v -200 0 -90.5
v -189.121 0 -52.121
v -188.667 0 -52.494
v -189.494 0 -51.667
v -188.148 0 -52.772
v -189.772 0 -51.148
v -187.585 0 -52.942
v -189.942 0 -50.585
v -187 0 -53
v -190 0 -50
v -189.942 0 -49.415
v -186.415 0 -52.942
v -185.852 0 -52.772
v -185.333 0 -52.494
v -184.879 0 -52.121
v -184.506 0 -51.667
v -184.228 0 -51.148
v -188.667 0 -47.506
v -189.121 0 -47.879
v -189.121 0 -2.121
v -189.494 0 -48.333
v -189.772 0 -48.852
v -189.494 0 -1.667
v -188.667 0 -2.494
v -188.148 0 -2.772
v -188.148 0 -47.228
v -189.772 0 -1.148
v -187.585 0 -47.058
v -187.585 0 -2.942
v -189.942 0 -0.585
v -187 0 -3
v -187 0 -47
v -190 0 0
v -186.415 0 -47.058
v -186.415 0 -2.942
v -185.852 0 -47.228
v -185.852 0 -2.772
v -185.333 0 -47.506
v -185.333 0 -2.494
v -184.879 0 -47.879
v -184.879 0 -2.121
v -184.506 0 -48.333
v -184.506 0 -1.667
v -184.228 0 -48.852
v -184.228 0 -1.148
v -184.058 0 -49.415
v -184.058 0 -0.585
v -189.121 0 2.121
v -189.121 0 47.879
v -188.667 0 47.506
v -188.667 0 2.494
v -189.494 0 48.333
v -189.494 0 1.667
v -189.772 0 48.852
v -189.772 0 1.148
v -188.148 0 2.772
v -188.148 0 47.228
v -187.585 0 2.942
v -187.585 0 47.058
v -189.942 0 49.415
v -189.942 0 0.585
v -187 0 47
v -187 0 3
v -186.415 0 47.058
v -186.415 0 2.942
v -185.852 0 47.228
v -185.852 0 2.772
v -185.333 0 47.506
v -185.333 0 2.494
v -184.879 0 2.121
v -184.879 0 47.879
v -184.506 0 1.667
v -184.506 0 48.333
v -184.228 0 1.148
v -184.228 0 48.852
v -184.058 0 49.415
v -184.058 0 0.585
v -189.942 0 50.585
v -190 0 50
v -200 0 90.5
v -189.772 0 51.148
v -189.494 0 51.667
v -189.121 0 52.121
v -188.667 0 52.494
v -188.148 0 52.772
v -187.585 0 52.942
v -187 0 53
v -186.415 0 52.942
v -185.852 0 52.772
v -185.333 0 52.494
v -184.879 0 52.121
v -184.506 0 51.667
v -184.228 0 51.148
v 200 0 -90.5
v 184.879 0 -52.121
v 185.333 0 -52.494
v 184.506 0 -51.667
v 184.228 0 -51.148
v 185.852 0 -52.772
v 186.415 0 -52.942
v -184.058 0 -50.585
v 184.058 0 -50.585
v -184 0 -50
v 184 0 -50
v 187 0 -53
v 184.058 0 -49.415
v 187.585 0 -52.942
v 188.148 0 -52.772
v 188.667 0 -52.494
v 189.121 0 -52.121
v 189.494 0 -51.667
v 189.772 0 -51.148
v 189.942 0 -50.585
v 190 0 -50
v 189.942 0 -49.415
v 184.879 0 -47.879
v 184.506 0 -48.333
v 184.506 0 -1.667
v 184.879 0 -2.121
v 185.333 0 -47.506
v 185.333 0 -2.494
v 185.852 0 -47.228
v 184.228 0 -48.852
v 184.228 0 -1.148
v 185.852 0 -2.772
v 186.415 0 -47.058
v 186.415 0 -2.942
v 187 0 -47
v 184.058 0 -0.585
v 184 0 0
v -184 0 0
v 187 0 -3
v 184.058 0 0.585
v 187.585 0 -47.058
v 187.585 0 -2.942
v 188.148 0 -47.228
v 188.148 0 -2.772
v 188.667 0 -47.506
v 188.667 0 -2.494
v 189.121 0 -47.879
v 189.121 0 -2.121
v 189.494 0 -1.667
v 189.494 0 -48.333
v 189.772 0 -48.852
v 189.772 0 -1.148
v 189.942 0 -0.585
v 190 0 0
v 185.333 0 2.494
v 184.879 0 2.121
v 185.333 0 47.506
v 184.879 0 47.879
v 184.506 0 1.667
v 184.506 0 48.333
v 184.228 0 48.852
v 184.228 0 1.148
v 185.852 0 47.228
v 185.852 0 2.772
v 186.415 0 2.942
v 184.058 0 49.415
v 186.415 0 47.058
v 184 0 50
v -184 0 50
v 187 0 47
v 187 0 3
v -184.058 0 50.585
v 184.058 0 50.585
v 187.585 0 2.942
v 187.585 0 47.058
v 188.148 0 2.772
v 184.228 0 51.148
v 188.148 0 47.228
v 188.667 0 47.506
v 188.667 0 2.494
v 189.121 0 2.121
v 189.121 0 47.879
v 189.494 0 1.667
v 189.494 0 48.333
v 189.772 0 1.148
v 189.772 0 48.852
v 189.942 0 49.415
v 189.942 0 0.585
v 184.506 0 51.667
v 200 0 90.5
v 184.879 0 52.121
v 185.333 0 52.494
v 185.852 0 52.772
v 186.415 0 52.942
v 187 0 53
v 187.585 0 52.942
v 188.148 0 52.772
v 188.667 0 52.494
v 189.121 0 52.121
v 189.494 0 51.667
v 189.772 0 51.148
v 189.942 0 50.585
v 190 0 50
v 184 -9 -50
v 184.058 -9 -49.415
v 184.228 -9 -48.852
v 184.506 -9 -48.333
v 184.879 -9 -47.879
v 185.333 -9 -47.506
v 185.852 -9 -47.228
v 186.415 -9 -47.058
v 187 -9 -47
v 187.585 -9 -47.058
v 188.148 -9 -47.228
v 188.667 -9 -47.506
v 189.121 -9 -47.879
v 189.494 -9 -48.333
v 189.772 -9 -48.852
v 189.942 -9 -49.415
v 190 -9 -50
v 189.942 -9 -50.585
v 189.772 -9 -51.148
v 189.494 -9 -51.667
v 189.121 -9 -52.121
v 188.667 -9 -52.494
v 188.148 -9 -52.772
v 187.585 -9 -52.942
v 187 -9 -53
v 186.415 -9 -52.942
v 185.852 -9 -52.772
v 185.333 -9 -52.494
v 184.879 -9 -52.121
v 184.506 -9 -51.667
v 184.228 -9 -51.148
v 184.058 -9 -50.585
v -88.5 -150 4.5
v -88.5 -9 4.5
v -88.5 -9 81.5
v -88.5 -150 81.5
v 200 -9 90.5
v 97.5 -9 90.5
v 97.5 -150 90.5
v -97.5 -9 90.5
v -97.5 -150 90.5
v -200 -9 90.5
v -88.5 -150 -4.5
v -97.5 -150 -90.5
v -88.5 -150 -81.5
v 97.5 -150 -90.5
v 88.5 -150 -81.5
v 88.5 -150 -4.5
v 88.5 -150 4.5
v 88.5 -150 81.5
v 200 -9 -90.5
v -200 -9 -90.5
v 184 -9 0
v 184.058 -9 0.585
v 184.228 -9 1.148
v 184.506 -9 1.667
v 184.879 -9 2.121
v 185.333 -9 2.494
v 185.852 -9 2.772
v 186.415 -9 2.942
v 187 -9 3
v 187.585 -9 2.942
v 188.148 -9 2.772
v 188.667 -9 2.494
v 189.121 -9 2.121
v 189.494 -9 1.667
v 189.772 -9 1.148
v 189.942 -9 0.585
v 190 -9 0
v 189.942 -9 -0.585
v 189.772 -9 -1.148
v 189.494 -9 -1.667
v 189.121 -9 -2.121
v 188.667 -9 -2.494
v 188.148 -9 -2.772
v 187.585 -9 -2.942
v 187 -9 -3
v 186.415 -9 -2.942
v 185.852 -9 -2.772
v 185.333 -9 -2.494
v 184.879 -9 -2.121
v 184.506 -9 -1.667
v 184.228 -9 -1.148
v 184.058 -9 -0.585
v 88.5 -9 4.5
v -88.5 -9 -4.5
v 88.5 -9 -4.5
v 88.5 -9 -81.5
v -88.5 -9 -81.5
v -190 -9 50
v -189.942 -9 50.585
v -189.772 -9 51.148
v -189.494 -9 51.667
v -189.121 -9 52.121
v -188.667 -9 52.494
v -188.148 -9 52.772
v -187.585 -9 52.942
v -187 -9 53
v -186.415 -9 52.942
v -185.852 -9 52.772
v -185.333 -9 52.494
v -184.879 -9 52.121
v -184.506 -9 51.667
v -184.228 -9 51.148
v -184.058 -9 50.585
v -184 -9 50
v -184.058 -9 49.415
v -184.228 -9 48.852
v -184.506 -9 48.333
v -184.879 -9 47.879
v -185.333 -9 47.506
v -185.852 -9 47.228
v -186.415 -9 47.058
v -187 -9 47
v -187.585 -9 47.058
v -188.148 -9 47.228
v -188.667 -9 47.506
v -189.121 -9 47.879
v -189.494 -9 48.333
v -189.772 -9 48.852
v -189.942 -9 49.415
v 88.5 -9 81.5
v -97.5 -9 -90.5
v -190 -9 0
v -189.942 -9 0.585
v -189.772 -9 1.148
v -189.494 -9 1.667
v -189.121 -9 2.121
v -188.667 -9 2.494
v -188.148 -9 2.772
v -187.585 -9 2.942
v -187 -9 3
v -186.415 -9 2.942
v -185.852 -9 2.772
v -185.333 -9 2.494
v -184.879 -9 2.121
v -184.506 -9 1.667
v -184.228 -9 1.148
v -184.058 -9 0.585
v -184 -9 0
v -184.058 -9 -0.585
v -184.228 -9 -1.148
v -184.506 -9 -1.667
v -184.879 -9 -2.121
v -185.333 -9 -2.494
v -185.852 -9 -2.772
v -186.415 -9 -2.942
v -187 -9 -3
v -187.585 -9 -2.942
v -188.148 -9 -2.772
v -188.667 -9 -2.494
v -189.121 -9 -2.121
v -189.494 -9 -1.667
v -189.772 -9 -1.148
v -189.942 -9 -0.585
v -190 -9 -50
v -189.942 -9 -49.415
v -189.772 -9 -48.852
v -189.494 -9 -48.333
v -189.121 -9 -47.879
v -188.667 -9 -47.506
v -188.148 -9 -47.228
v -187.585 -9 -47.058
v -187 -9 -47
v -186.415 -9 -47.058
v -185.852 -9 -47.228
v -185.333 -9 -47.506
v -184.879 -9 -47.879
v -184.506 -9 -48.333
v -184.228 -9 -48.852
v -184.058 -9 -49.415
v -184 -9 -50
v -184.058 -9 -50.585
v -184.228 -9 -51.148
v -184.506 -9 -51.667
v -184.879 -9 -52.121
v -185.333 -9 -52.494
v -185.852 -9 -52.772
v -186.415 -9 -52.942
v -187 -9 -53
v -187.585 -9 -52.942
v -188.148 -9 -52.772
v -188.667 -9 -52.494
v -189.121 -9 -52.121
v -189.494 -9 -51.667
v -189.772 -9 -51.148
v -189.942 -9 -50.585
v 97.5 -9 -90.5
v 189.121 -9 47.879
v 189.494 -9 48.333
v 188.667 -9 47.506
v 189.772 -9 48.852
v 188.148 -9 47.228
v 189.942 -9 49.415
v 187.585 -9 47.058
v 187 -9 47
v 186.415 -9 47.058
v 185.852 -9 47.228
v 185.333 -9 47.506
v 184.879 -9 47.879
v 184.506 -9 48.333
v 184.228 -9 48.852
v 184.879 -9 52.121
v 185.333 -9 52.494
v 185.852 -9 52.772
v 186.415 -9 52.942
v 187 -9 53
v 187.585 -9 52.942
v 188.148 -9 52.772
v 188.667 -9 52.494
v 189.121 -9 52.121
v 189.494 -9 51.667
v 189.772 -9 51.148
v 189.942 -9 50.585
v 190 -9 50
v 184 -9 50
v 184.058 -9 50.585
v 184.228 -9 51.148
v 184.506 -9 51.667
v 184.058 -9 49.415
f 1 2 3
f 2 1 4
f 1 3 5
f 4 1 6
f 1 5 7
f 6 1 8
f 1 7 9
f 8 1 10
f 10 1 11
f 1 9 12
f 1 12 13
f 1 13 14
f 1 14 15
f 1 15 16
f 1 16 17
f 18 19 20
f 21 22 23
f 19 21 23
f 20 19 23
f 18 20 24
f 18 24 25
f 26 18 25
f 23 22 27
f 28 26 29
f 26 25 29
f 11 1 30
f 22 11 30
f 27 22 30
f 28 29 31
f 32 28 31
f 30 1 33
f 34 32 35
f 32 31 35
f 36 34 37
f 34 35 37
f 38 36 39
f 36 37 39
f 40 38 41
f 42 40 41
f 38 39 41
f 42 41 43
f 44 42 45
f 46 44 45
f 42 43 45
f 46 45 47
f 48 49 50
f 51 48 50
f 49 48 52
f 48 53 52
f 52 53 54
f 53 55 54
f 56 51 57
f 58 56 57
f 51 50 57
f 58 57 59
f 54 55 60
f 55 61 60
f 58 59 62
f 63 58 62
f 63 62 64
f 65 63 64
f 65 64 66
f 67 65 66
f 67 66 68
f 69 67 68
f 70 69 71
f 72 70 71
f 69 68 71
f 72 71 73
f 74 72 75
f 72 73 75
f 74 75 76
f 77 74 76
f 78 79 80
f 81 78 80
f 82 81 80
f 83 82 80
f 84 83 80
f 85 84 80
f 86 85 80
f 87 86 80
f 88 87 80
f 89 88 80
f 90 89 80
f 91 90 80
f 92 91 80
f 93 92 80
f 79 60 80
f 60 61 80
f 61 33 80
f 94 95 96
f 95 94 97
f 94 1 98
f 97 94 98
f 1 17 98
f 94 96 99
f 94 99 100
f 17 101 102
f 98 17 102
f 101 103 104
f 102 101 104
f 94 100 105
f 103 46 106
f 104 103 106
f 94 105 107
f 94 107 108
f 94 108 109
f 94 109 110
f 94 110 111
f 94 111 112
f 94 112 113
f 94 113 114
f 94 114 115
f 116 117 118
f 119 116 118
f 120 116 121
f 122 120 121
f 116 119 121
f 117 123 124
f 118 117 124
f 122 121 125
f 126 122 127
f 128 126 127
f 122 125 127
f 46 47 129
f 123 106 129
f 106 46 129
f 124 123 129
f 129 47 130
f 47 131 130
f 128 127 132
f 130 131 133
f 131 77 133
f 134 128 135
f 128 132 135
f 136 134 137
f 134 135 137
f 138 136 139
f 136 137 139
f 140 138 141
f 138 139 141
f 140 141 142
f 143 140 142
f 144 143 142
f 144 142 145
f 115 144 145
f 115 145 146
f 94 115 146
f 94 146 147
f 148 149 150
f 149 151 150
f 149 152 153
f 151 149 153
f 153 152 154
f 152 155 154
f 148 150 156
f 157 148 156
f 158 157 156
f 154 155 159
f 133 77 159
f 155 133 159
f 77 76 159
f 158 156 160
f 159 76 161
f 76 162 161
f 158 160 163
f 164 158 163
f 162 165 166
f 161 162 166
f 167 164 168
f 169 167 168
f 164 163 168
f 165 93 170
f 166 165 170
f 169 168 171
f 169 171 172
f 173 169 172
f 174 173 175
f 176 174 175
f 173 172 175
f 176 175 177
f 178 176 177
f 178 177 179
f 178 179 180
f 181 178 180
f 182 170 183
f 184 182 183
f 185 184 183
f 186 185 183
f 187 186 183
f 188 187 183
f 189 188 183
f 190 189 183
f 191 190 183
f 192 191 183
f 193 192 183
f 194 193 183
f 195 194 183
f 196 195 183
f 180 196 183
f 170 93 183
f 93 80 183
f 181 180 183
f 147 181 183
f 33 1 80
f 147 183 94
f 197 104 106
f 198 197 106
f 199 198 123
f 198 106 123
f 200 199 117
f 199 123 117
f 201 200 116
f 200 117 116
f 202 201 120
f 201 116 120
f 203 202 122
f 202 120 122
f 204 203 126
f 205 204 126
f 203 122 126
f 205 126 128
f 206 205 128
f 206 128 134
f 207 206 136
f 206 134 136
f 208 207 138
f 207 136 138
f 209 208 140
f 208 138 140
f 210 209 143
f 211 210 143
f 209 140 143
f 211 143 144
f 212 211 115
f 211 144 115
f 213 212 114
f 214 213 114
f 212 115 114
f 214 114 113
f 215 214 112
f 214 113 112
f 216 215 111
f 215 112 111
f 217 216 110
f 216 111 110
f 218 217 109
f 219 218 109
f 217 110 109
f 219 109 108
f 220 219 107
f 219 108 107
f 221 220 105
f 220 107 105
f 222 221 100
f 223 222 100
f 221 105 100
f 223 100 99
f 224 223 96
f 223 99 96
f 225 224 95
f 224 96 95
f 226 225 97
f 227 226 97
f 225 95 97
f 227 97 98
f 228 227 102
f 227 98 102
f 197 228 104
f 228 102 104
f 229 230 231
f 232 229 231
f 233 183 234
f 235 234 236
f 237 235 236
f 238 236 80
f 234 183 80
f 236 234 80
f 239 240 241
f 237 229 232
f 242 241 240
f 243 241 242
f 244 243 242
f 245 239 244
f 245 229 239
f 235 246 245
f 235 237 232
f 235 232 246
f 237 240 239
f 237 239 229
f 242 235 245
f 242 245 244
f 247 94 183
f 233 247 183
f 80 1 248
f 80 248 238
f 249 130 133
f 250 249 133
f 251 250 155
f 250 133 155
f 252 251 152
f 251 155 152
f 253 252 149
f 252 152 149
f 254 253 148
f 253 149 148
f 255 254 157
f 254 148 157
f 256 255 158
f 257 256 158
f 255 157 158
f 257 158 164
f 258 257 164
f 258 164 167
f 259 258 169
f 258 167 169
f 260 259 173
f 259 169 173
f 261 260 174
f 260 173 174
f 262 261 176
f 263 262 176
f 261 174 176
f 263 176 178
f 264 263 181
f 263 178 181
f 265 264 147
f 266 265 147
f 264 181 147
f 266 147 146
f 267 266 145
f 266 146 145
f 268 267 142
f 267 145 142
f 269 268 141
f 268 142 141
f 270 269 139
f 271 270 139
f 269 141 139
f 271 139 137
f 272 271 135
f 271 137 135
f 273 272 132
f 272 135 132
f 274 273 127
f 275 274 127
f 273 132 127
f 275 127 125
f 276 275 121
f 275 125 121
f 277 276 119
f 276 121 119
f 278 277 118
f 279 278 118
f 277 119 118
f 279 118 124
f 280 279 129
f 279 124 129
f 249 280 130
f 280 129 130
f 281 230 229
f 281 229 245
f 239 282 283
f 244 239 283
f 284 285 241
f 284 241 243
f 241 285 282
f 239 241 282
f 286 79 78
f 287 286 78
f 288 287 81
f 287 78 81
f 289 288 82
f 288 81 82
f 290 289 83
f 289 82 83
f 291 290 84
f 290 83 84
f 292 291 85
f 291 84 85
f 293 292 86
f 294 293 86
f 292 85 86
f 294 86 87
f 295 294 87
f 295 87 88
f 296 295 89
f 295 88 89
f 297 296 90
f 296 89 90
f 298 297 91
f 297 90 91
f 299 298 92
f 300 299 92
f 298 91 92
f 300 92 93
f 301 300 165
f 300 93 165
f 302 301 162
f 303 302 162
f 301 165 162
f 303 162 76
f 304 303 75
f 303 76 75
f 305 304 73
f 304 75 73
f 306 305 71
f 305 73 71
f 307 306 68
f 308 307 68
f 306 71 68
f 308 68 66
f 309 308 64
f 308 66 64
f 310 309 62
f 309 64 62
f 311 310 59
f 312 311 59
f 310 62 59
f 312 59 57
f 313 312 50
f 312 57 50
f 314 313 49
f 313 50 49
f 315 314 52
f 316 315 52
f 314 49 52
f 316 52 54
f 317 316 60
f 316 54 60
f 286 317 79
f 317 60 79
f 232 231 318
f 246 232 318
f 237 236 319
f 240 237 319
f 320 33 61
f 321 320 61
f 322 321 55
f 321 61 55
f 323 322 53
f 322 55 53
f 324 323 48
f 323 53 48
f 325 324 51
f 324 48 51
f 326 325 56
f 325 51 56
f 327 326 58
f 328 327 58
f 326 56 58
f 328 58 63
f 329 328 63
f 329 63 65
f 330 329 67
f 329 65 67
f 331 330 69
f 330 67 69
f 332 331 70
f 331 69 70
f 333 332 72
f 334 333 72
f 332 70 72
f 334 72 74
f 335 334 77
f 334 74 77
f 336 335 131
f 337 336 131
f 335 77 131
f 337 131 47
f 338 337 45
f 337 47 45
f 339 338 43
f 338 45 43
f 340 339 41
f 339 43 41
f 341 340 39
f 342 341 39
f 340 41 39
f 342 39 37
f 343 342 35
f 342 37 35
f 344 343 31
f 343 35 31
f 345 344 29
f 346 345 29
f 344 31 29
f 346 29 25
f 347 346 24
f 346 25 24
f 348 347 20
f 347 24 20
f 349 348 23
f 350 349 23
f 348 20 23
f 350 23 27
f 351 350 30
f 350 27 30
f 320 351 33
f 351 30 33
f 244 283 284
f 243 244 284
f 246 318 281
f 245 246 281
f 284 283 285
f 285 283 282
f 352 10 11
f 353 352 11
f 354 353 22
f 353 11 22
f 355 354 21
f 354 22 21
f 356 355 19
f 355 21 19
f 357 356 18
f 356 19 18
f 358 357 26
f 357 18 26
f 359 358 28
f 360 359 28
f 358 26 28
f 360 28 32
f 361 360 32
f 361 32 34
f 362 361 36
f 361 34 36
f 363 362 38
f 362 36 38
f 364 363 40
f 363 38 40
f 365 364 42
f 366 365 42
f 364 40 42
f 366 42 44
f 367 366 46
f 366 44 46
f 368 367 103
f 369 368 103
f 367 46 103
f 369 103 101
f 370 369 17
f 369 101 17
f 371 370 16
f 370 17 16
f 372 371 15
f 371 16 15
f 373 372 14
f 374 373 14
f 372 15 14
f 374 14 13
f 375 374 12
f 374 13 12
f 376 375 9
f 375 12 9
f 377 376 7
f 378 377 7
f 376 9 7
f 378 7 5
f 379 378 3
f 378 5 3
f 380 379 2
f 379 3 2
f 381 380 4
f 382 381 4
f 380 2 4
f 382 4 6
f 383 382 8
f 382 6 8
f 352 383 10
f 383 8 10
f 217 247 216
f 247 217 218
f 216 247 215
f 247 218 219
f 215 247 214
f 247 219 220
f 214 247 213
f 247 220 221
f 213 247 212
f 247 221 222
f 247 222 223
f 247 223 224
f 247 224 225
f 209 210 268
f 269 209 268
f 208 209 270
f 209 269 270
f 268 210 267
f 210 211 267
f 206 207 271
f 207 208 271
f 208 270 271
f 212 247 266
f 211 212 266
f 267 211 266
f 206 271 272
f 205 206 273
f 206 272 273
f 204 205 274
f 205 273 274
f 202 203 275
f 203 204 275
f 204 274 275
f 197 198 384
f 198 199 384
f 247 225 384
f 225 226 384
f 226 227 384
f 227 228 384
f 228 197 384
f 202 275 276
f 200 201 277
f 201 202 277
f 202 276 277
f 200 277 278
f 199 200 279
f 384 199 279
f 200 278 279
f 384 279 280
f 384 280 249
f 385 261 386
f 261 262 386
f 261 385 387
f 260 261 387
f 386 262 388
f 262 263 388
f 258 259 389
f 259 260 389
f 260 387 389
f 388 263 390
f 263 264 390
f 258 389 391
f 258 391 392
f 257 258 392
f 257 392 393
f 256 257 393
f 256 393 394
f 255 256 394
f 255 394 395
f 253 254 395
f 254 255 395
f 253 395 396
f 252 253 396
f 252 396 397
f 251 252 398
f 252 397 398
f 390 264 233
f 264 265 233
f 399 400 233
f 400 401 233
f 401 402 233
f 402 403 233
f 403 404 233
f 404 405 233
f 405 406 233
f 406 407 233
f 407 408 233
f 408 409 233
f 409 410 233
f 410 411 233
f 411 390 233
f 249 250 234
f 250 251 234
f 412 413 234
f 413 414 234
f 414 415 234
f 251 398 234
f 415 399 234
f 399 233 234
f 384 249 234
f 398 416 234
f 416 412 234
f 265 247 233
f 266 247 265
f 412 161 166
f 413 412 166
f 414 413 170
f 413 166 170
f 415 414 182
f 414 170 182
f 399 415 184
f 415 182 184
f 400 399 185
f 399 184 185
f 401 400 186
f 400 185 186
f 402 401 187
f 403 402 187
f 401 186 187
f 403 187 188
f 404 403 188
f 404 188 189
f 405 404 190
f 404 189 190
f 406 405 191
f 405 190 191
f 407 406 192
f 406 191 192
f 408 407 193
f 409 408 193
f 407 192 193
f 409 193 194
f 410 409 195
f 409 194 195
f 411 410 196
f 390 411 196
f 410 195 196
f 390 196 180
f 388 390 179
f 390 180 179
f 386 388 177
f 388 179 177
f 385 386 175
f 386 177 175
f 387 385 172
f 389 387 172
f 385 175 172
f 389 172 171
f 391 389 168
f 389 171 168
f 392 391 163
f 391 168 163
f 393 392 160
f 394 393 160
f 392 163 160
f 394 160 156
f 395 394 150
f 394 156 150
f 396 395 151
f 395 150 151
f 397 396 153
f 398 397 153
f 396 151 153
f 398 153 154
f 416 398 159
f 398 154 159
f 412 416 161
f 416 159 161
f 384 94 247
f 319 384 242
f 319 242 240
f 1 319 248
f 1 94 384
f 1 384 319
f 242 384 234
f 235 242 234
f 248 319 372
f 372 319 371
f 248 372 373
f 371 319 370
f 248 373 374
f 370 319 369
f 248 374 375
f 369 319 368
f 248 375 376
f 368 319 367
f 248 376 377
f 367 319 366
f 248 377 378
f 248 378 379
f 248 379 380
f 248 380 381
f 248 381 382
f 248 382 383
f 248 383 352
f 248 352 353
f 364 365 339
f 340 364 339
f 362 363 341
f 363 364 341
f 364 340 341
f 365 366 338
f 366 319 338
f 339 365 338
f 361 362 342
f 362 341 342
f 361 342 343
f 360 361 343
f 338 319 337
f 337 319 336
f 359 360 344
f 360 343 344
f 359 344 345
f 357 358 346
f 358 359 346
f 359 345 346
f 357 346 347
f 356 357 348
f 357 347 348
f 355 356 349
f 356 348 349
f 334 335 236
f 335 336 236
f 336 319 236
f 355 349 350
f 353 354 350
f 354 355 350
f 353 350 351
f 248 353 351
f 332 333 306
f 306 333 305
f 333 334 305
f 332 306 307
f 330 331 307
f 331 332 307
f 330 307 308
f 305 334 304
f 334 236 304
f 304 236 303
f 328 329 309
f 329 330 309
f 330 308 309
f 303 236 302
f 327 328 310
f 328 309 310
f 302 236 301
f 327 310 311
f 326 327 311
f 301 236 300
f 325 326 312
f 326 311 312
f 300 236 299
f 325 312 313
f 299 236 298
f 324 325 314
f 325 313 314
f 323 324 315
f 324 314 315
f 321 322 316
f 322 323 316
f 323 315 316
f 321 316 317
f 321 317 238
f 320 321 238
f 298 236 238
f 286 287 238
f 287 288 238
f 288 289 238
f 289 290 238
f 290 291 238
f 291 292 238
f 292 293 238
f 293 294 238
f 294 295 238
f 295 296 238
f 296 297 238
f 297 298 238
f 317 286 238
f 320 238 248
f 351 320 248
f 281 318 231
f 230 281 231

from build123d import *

# Parameters (mm, degrees)
F0_W     = 177
F0_H     = 9
F1_DEPTH = 150
F2_W     = 400
F2_H     = 181
F2_R     = 3
F3_DEPTH = 9
F4_DEPTH = 150


with BuildPart() as f1:
    # F0 (on Front) → F1 (new body)
    with BuildSketch(Plane.XZ):
        Rectangle(F0_W, F0_H)
        with Locations((0, -86)):
            Rectangle(F0_W, F0_H)
        with Locations((0, 86)):
            Rectangle(F0_W, F0_H)
    extrude(amount=F1_DEPTH)

    # F2 (on face) → F3 (join)
    with BuildSketch(Plane(origin=(0, 0, 0), x_dir=(-1, 0, 0), z_dir=(0, 1, 0))):
        Rectangle(F2_W, F2_H)
        with Locations((-187, -50)):
            Circle(F2_R, mode=Mode.SUBTRACT)
        with Locations((187, -50)):
            Circle(F2_R, mode=Mode.SUBTRACT)
        with Locations((-187, 0)):
            Circle(F2_R, mode=Mode.SUBTRACT)
        with Locations((-187, 50)):
            Circle(F2_R, mode=Mode.SUBTRACT)
        with Locations((187, 0)):
            Circle(F2_R, mode=Mode.SUBTRACT)
        with Locations((187, 50)):
            Circle(F2_R, mode=Mode.SUBTRACT)
    extrude(amount=-F3_DEPTH)

    # F0 (on Front) → F4 (join)
    with BuildSketch(Plane.XZ):
        Polygon((-88.5, -81.5), (-88.5, -4.5), (-88.5, 4.5), (-88.5, 81.5), (-88.5, 90.5), (-97.5, 90.5), (-97.5, -90.5), (-88.5, -90.5), align=None)
        Polygon((88.5, 4.5), (88.5, -4.5), (88.5, -81.5), (88.5, -90.5), (97.5, -90.5), (97.5, 90.5), (88.5, 90.5), (88.5, 81.5), align=None)
    extrude(amount=F4_DEPTH)


solid = f1.part
